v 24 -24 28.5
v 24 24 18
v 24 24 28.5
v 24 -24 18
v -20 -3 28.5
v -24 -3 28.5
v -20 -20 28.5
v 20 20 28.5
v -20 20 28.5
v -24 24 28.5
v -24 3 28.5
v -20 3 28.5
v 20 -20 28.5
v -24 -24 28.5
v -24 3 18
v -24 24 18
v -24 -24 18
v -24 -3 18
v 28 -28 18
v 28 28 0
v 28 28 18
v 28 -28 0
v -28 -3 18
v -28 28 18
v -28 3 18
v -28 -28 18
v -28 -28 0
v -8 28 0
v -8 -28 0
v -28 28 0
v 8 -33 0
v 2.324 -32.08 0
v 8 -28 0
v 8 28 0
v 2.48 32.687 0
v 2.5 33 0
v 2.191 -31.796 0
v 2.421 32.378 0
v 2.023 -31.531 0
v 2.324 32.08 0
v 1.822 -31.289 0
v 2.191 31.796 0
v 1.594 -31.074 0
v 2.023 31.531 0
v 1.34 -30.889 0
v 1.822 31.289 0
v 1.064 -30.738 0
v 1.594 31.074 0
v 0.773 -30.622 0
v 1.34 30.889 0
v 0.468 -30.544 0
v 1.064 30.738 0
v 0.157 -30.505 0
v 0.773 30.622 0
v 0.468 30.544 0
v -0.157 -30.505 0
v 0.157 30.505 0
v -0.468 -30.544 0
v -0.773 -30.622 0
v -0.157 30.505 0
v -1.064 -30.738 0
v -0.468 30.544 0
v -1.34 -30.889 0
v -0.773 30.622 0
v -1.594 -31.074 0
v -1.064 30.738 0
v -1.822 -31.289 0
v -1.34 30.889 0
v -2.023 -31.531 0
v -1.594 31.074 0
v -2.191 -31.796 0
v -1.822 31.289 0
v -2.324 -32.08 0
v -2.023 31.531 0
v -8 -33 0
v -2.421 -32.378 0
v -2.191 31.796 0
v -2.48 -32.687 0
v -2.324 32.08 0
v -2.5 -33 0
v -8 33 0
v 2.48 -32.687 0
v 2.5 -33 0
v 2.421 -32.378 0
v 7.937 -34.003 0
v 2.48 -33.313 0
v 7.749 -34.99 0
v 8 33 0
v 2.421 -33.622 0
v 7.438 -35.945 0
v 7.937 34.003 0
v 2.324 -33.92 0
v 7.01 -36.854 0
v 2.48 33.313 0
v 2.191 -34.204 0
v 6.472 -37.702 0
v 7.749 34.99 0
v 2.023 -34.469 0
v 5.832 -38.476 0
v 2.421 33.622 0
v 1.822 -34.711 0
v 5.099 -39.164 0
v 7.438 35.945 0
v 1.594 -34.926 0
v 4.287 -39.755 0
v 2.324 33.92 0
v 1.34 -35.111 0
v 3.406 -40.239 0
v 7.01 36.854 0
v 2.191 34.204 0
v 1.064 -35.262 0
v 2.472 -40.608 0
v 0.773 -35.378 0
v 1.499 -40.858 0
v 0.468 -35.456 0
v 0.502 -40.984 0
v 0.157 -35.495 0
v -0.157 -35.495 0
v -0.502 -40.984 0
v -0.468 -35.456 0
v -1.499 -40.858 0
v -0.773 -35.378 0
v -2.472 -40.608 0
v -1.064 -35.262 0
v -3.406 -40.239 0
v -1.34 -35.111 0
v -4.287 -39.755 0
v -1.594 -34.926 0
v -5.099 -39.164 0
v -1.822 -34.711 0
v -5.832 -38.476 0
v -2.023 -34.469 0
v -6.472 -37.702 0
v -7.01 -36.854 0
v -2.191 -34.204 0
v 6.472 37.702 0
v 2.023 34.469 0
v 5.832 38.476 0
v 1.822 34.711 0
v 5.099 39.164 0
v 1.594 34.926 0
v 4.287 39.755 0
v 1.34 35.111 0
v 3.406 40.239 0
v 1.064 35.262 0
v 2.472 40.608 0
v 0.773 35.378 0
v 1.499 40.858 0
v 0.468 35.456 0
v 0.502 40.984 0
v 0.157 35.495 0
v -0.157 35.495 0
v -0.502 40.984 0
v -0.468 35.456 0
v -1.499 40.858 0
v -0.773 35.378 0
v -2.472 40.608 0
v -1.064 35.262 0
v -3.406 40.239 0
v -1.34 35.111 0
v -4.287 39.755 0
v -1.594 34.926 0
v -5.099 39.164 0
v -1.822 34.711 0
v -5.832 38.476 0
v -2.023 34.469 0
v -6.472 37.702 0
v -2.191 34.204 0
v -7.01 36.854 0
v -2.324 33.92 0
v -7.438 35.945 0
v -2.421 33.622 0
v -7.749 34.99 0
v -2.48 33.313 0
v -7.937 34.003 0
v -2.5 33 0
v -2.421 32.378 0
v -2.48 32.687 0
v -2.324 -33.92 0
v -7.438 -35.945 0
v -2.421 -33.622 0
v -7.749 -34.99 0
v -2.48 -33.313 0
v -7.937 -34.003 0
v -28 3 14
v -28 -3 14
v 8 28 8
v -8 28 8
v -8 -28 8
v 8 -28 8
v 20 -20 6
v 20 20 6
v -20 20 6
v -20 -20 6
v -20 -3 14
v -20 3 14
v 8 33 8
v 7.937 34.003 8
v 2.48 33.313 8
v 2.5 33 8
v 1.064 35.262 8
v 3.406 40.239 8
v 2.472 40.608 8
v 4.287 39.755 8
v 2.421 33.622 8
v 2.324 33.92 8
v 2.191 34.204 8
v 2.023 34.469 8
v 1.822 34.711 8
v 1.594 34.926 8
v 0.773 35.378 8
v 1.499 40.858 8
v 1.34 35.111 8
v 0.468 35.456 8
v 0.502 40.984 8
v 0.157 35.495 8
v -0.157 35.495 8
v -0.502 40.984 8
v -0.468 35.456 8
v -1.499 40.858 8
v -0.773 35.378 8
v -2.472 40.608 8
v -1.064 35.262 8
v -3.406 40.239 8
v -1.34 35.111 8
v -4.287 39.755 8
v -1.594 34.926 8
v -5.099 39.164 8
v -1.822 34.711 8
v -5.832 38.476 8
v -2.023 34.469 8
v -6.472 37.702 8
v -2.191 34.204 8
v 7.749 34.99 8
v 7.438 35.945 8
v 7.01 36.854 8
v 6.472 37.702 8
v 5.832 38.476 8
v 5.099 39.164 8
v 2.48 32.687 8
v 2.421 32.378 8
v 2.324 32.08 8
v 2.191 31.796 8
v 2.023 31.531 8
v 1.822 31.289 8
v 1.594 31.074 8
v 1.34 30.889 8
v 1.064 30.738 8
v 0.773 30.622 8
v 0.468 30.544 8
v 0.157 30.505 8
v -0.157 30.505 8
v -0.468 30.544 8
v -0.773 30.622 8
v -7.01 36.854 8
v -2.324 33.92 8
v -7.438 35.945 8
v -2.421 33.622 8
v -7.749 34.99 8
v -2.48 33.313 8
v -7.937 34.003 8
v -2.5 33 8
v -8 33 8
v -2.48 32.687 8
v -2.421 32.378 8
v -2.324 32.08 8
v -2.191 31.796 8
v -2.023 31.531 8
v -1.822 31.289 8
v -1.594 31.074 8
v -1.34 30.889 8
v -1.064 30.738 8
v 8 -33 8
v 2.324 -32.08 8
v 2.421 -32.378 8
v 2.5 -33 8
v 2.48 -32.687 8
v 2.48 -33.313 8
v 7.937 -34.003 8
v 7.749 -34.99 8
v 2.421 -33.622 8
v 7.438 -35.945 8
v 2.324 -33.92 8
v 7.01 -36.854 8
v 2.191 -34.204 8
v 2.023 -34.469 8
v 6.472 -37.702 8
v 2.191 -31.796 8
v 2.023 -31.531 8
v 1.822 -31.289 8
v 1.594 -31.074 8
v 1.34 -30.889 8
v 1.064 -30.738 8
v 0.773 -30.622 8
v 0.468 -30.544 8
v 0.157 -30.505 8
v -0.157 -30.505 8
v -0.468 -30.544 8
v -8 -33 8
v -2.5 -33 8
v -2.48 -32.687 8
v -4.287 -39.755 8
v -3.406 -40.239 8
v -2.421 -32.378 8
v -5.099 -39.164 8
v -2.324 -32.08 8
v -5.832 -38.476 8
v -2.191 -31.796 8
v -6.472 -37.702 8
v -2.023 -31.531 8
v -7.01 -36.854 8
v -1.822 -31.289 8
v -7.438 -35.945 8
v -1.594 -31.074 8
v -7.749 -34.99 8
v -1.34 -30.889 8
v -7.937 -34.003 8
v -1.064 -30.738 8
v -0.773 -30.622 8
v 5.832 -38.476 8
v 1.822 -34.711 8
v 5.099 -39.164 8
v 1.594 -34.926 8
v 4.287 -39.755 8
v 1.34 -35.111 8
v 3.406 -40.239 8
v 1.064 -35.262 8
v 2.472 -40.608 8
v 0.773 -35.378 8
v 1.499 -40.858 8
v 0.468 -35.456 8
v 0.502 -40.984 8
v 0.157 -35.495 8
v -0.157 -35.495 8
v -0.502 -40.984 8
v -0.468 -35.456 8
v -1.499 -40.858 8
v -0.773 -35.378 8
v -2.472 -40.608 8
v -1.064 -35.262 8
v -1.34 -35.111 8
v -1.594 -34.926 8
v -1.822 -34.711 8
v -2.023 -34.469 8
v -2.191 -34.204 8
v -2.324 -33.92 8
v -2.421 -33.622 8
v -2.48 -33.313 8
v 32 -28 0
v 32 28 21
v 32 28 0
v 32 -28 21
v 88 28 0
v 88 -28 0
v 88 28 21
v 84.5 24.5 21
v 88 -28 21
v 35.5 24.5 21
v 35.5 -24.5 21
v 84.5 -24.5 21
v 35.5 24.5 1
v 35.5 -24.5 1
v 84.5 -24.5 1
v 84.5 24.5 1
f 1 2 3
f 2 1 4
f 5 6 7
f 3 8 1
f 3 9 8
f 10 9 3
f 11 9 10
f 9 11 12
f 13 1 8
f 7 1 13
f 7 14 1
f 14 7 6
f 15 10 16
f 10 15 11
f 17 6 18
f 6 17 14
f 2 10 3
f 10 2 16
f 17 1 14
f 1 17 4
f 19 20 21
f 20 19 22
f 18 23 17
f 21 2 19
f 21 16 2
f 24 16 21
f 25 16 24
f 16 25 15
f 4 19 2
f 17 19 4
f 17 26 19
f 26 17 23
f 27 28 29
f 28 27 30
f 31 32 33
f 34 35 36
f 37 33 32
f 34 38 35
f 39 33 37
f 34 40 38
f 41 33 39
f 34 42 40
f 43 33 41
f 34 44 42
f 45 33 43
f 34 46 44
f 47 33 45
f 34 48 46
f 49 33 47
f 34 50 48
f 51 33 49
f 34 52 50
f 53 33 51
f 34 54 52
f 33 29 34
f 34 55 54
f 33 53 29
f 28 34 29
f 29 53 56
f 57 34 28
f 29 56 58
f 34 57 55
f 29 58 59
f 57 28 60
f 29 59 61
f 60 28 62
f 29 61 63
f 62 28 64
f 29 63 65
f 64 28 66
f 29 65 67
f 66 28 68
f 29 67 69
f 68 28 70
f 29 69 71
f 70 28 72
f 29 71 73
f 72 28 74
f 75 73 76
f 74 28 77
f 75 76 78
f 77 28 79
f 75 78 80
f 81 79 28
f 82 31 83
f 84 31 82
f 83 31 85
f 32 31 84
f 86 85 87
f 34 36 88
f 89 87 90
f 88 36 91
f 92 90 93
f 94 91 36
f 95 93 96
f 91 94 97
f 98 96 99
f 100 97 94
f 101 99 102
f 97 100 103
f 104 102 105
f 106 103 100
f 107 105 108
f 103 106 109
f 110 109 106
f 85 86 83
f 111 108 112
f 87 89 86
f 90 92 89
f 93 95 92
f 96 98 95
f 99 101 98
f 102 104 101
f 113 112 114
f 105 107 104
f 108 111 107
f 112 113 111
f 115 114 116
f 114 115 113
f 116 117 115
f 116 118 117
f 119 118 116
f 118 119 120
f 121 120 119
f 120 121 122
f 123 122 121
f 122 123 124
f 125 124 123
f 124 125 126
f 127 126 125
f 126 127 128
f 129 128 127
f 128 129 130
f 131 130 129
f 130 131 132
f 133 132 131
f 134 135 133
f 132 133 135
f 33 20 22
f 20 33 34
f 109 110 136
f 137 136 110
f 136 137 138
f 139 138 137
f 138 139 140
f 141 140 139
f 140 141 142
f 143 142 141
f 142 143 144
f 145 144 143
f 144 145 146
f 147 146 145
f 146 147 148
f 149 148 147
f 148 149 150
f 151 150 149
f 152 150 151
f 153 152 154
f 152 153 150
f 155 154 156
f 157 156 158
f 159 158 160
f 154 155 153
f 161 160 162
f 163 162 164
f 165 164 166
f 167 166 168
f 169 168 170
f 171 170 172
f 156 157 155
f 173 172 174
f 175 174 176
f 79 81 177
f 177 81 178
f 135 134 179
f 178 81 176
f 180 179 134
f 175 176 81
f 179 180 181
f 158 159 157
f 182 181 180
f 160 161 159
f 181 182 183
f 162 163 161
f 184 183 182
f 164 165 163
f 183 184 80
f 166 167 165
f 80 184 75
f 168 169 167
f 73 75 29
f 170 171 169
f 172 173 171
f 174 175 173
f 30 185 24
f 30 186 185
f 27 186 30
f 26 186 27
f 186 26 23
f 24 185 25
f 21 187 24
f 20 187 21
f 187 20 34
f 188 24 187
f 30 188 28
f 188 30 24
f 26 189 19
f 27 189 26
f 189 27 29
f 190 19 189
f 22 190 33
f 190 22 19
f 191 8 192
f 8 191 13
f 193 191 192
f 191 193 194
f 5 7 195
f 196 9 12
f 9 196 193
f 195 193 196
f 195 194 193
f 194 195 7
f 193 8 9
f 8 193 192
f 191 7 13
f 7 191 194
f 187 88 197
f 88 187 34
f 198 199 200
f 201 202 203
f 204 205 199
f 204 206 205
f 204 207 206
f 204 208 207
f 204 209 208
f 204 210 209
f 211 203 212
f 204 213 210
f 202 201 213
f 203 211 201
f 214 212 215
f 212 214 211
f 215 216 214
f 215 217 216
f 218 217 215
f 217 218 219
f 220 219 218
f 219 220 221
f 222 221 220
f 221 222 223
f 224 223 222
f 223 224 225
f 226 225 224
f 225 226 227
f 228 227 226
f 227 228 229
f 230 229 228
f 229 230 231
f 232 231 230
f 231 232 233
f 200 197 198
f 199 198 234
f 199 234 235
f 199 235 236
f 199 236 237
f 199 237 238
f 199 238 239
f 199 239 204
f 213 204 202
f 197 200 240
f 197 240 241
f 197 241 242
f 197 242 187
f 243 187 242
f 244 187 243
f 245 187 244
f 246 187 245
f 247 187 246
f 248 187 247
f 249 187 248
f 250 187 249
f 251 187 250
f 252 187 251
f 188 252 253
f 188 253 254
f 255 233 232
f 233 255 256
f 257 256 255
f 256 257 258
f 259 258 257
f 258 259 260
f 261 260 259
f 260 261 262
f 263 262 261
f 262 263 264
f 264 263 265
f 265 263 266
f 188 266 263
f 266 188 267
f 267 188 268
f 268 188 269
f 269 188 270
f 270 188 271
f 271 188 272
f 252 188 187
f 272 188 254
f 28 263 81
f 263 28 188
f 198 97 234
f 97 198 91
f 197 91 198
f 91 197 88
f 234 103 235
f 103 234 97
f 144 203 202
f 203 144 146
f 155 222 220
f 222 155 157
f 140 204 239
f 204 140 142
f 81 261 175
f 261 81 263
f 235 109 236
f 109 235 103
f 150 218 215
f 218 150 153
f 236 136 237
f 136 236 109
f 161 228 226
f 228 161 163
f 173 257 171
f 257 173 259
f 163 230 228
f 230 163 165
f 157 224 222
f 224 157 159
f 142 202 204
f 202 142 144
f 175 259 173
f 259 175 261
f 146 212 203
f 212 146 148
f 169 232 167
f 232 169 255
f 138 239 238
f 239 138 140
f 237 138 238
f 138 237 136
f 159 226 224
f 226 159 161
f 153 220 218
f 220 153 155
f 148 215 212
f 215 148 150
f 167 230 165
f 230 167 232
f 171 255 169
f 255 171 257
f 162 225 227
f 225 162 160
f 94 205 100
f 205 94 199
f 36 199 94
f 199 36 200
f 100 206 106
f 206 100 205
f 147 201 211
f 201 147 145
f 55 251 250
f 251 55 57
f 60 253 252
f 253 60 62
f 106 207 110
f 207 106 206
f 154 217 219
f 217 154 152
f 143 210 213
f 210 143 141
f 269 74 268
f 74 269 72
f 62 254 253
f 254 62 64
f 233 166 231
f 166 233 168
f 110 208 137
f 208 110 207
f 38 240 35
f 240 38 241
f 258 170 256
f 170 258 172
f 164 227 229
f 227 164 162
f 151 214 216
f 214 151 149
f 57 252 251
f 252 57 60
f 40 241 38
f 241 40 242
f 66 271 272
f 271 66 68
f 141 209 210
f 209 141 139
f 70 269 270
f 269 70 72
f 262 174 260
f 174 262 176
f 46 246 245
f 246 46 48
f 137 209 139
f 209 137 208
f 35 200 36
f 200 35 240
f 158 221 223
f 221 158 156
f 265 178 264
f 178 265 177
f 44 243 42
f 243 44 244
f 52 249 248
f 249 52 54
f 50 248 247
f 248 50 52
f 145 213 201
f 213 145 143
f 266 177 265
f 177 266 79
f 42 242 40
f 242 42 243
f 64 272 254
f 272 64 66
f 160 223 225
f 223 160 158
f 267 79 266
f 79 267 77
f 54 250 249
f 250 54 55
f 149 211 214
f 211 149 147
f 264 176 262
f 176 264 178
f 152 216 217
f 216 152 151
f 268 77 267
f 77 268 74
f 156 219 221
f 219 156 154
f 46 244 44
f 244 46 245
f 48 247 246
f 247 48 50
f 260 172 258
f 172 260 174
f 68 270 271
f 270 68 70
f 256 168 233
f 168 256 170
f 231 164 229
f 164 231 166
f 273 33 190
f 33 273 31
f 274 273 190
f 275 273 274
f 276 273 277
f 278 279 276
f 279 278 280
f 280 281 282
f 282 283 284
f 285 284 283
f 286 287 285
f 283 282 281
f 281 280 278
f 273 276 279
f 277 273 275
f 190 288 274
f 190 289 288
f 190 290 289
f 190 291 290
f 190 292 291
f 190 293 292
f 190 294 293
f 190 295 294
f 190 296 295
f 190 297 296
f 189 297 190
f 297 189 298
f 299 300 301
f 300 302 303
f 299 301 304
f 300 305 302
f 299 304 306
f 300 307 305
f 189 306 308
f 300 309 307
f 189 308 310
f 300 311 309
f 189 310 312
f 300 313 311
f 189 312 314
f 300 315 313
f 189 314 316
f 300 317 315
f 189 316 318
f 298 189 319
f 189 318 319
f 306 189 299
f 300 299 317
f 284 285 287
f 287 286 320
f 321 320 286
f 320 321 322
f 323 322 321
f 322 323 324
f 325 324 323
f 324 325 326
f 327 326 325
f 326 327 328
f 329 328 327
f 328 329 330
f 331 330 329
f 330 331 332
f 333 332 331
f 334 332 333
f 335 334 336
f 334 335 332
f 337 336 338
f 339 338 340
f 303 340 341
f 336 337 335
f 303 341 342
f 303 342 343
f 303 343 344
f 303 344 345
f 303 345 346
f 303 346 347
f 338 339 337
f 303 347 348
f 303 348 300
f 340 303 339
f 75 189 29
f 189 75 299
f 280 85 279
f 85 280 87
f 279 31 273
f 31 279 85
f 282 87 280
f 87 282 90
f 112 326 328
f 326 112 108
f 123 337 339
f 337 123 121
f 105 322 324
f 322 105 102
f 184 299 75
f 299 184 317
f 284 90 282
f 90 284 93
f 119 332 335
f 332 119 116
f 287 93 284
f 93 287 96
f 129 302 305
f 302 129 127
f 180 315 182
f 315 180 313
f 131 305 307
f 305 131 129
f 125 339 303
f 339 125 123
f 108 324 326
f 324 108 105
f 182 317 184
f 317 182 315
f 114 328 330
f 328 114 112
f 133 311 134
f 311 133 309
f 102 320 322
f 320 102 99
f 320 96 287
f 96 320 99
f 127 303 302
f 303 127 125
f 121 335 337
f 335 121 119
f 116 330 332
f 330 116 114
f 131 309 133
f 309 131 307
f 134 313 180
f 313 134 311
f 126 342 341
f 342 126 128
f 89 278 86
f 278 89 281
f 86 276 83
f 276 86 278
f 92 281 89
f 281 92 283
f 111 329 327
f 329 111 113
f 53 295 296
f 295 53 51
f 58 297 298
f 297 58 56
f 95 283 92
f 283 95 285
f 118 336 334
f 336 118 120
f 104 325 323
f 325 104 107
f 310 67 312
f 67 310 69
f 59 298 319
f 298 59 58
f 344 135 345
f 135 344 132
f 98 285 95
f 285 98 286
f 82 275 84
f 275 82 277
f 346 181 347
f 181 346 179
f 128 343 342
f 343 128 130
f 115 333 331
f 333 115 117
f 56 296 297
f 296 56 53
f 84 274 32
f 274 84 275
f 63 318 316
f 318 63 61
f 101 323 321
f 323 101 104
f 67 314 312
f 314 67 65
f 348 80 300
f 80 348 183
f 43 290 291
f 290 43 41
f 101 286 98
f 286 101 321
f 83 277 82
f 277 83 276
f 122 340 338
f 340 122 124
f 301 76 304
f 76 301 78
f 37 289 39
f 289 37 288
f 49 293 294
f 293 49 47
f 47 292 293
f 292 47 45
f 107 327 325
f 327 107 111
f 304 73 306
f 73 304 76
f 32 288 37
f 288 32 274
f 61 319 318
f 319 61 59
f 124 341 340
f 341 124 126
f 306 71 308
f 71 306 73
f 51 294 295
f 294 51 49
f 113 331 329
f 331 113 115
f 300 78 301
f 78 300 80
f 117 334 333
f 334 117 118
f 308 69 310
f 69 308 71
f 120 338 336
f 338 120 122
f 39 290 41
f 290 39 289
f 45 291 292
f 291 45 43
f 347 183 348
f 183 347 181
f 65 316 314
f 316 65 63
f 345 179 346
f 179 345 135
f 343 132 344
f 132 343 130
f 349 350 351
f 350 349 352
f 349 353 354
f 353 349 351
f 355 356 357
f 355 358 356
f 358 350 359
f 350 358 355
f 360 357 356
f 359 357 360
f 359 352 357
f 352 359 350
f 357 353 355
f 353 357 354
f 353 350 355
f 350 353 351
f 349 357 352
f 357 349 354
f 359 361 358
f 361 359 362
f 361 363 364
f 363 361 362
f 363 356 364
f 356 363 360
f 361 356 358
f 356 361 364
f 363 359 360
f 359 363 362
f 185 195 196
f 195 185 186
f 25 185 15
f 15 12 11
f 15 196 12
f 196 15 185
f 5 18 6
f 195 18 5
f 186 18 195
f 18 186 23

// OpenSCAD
//	throated box
//	
//	verion 1.1
//	
//	generates a 3D model of a box of arbitrary internal dimensions
//	with a "throat" on which the lid rests
//
//	by Theron Trowbridge
//	therontrowbridge.com


//	Parameters
//	CHANGE THESE

//	interior size
int_x = 40;
int_y = 40;
int_z = 30;

//  tab parameters
tab_hole_radius=2.5;
tab_outer_radius=8;

//	thin walls
//	if "true" this takes the shortest dimension of the box
//	and uses that to calculate wall thickness for each side
//	if "false" the walls are proportional
//	to the size of the box in each dimension
thin_walls = false;

//	wall thickness
//	wall thickness is calculated as a coefficient
//	of the interior dimensions
//
//	with thick walls (thin_walls==false),
//	larger values produce odd results
inner_sides = 0.1;
outer_sides = 0.1;

//	inner_length and outer_length determine how tall
//	the "throat" is and how much room there is
//	under the lid but above the throat
//	these are coefficients of the interior volume of the box
//	and as such should be > 0 and <= 1.0
//	when inner_length == 1.0, lid sits right on throat
inner_length = 0.75;
outer_length = 0.5;
lid_length = 1-outer_length;

//	slop is an adjustment to make the lid a little looser
//	so that it fits without being too tight.
slop = 1;


//	Calculations

inner_x = int_x + ( int_x * ( inner_sides * 2 ) );
inner_y = int_y + ( int_y * ( inner_sides * 2 ) );
inner_z = ( int_z * inner_length ) + ( int_z * inner_sides );
full_inner_z = int_z + ( int_z * inner_sides );

outer_x = inner_x + ( int_x * ( outer_sides * 2 ) );
outer_y = inner_y + ( int_y * ( outer_sides * 2 ) );
outer_z = ( int_z * outer_length ) + ( int_z * outer_sides );

lid_x = inner_x + ( int_x * ( inner_sides * 2 ) );
lid_y = inner_y + ( int_y * ( inner_sides * 2 ) );
lid_z = ( int_z * lid_length ) + (int_z * inner_sides ) + ( int_z * outer_sides );


//	Calculations for thin_walls==true

min_int_xy = min( int_x, int_y );
min_int = min( int_z, min_int_xy );

inner_thickness = min_int * inner_sides;
outer_thickness = min_int * outer_sides;


thin_inner_x = int_x + ( inner_thickness * 2 );
thin_inner_y = int_y + ( inner_thickness * 2 );
thin_inner_z = ( int_z * inner_length ) + inner_thickness;
thin_full_inner_z = int_z + inner_thickness;

thin_outer_x = thin_inner_x + ( outer_thickness * 2 );
thin_outer_y = thin_inner_y + ( outer_thickness * 2 );
thin_outer_z = ( int_z * outer_length ) + outer_thickness;

thin_lid_x = thin_inner_x + ( outer_thickness * 2 );
thin_lid_y = thin_inner_y + ( outer_thickness * 2 );
thin_lid_z = ( int_z * lid_length ) + inner_thickness + outer_thickness;

mythick = outer_thickness + 2;
thick = inner_thickness + outer_thickness;
  
if ( thin_walls == false ) {
  difference() {
    thick_box();
  	translate([-outer_x/2 - 1,-thick/2,thick + 8])
  	  cube([thick+5, thick, thin_outer_z * 2]);
  }
} else {
	thin_box();
}

module tab() {
	difference(){
		union() {
			translate([-2*tab_outer_radius,-tab_outer_radius,0])
			  cube([2*tab_outer_radius,tab_outer_radius,outer_thickness + 5]);
			translate([-tab_outer_radius,0,0])
				cylinder(r=tab_outer_radius, h = outer_thickness + 5, $fn=50);
		}
		translate([-tab_outer_radius,0,0])
		cylinder(r= tab_hole_radius, h = outer_thickness+20,center=true, $fn=50);
	}
}

module insert_tabs(tab_outer_y) {
  translate([tab_outer_radius, tab_outer_y + mythick,0]) {
    tab();
    mirror([0, 1, 0]) {
      translate([0, 2*tab_outer_y + 2 * mythick, 0])
      tab();
    }
  }
}

module thick_box() {
	//	box bottom
	difference() {
		union() {
			//	innner box volume
			translate( v=[0,0,(inner_z/2)+(int_z*inner_sides)] ) {
				cube( size=[inner_x,inner_y,inner_z], center=true );
			}
			//	outer box volume
			translate( v=[0,0,outer_z/2] ) {
				cube( size=[outer_x,outer_y,outer_z], center=true );
			}
		}
	
		//	interior volume
		translate( v=[0,0,(int_z/2)+(int_z*inner_sides)+(int_z*outer_sides)] ) {
			cube( size=[int_x,int_y,int_z], center=true );
		}
	}
	
	insert_tabs(outer_y / 2);
	
	//	lid
	translate( v=[	(1+(inner_sides+outer_sides*4))*int_x,0,outer_z+lid_z] ) {
		rotate( a=[0,180,0] ) {
			difference() {
				//	lid volume
				translate( v=[	0,0,(lid_z/2)+outer_z] ) {
					cube( size=[lid_x,lid_y,lid_z], center=true );
				}
				//	inner box volume, all the way to the lid
				translate( v=[0,0,(full_inner_z/2)+(int_z*inner_sides)] ) {
					cube( size=[inner_x+slop,inner_y+slop,full_inner_z+4], center=true );
				}
			}
		}
	}
}


module thin_box() {
	//	box bottom
	difference() {
		union() {
			//	innner box volume
			translate( v=[0,0,(inner_z/2)+outer_thickness] ) {
				cube( size=[inner_x,inner_y,inner_z], center=true );
			}
			//	outer box volume
			translate( v=[0,0,thin_outer_z/2] ) {
				cube( size=[thin_outer_x,thin_outer_y,thin_outer_z], center=true );
			}
		}

		//	interior volume
		translate( v=[0,0,(int_z/2)+inner_thickness+outer_thickness] ) {
			cube( size=[int_x,int_y,int_z], center=true );
		}
	}

  insert_tabs(thin_outer_y / 2);

	//	lid
	translate( v=[	(int_x+(inner_thickness+outer_thickness)*3),0,thin_outer_z+thin_lid_z] ) {
		rotate( a=[0,180,0] ) {
			difference() {
				//	lid volume
				translate( v=[0,0,(thin_lid_z/2)+thin_outer_z] ) {
					cube( size=[thin_lid_x,thin_lid_y,thin_lid_z], center=true );
				}
				//	inner box volume, all the way to the lid
				translate( v=[0,0,(thin_full_inner_z/2)+inner_thickness] ) {
					cube( size=[thin_inner_x+slop,thin_inner_y+slop,thin_full_inner_z], center=true );
				}
			}
		}
	}
}
